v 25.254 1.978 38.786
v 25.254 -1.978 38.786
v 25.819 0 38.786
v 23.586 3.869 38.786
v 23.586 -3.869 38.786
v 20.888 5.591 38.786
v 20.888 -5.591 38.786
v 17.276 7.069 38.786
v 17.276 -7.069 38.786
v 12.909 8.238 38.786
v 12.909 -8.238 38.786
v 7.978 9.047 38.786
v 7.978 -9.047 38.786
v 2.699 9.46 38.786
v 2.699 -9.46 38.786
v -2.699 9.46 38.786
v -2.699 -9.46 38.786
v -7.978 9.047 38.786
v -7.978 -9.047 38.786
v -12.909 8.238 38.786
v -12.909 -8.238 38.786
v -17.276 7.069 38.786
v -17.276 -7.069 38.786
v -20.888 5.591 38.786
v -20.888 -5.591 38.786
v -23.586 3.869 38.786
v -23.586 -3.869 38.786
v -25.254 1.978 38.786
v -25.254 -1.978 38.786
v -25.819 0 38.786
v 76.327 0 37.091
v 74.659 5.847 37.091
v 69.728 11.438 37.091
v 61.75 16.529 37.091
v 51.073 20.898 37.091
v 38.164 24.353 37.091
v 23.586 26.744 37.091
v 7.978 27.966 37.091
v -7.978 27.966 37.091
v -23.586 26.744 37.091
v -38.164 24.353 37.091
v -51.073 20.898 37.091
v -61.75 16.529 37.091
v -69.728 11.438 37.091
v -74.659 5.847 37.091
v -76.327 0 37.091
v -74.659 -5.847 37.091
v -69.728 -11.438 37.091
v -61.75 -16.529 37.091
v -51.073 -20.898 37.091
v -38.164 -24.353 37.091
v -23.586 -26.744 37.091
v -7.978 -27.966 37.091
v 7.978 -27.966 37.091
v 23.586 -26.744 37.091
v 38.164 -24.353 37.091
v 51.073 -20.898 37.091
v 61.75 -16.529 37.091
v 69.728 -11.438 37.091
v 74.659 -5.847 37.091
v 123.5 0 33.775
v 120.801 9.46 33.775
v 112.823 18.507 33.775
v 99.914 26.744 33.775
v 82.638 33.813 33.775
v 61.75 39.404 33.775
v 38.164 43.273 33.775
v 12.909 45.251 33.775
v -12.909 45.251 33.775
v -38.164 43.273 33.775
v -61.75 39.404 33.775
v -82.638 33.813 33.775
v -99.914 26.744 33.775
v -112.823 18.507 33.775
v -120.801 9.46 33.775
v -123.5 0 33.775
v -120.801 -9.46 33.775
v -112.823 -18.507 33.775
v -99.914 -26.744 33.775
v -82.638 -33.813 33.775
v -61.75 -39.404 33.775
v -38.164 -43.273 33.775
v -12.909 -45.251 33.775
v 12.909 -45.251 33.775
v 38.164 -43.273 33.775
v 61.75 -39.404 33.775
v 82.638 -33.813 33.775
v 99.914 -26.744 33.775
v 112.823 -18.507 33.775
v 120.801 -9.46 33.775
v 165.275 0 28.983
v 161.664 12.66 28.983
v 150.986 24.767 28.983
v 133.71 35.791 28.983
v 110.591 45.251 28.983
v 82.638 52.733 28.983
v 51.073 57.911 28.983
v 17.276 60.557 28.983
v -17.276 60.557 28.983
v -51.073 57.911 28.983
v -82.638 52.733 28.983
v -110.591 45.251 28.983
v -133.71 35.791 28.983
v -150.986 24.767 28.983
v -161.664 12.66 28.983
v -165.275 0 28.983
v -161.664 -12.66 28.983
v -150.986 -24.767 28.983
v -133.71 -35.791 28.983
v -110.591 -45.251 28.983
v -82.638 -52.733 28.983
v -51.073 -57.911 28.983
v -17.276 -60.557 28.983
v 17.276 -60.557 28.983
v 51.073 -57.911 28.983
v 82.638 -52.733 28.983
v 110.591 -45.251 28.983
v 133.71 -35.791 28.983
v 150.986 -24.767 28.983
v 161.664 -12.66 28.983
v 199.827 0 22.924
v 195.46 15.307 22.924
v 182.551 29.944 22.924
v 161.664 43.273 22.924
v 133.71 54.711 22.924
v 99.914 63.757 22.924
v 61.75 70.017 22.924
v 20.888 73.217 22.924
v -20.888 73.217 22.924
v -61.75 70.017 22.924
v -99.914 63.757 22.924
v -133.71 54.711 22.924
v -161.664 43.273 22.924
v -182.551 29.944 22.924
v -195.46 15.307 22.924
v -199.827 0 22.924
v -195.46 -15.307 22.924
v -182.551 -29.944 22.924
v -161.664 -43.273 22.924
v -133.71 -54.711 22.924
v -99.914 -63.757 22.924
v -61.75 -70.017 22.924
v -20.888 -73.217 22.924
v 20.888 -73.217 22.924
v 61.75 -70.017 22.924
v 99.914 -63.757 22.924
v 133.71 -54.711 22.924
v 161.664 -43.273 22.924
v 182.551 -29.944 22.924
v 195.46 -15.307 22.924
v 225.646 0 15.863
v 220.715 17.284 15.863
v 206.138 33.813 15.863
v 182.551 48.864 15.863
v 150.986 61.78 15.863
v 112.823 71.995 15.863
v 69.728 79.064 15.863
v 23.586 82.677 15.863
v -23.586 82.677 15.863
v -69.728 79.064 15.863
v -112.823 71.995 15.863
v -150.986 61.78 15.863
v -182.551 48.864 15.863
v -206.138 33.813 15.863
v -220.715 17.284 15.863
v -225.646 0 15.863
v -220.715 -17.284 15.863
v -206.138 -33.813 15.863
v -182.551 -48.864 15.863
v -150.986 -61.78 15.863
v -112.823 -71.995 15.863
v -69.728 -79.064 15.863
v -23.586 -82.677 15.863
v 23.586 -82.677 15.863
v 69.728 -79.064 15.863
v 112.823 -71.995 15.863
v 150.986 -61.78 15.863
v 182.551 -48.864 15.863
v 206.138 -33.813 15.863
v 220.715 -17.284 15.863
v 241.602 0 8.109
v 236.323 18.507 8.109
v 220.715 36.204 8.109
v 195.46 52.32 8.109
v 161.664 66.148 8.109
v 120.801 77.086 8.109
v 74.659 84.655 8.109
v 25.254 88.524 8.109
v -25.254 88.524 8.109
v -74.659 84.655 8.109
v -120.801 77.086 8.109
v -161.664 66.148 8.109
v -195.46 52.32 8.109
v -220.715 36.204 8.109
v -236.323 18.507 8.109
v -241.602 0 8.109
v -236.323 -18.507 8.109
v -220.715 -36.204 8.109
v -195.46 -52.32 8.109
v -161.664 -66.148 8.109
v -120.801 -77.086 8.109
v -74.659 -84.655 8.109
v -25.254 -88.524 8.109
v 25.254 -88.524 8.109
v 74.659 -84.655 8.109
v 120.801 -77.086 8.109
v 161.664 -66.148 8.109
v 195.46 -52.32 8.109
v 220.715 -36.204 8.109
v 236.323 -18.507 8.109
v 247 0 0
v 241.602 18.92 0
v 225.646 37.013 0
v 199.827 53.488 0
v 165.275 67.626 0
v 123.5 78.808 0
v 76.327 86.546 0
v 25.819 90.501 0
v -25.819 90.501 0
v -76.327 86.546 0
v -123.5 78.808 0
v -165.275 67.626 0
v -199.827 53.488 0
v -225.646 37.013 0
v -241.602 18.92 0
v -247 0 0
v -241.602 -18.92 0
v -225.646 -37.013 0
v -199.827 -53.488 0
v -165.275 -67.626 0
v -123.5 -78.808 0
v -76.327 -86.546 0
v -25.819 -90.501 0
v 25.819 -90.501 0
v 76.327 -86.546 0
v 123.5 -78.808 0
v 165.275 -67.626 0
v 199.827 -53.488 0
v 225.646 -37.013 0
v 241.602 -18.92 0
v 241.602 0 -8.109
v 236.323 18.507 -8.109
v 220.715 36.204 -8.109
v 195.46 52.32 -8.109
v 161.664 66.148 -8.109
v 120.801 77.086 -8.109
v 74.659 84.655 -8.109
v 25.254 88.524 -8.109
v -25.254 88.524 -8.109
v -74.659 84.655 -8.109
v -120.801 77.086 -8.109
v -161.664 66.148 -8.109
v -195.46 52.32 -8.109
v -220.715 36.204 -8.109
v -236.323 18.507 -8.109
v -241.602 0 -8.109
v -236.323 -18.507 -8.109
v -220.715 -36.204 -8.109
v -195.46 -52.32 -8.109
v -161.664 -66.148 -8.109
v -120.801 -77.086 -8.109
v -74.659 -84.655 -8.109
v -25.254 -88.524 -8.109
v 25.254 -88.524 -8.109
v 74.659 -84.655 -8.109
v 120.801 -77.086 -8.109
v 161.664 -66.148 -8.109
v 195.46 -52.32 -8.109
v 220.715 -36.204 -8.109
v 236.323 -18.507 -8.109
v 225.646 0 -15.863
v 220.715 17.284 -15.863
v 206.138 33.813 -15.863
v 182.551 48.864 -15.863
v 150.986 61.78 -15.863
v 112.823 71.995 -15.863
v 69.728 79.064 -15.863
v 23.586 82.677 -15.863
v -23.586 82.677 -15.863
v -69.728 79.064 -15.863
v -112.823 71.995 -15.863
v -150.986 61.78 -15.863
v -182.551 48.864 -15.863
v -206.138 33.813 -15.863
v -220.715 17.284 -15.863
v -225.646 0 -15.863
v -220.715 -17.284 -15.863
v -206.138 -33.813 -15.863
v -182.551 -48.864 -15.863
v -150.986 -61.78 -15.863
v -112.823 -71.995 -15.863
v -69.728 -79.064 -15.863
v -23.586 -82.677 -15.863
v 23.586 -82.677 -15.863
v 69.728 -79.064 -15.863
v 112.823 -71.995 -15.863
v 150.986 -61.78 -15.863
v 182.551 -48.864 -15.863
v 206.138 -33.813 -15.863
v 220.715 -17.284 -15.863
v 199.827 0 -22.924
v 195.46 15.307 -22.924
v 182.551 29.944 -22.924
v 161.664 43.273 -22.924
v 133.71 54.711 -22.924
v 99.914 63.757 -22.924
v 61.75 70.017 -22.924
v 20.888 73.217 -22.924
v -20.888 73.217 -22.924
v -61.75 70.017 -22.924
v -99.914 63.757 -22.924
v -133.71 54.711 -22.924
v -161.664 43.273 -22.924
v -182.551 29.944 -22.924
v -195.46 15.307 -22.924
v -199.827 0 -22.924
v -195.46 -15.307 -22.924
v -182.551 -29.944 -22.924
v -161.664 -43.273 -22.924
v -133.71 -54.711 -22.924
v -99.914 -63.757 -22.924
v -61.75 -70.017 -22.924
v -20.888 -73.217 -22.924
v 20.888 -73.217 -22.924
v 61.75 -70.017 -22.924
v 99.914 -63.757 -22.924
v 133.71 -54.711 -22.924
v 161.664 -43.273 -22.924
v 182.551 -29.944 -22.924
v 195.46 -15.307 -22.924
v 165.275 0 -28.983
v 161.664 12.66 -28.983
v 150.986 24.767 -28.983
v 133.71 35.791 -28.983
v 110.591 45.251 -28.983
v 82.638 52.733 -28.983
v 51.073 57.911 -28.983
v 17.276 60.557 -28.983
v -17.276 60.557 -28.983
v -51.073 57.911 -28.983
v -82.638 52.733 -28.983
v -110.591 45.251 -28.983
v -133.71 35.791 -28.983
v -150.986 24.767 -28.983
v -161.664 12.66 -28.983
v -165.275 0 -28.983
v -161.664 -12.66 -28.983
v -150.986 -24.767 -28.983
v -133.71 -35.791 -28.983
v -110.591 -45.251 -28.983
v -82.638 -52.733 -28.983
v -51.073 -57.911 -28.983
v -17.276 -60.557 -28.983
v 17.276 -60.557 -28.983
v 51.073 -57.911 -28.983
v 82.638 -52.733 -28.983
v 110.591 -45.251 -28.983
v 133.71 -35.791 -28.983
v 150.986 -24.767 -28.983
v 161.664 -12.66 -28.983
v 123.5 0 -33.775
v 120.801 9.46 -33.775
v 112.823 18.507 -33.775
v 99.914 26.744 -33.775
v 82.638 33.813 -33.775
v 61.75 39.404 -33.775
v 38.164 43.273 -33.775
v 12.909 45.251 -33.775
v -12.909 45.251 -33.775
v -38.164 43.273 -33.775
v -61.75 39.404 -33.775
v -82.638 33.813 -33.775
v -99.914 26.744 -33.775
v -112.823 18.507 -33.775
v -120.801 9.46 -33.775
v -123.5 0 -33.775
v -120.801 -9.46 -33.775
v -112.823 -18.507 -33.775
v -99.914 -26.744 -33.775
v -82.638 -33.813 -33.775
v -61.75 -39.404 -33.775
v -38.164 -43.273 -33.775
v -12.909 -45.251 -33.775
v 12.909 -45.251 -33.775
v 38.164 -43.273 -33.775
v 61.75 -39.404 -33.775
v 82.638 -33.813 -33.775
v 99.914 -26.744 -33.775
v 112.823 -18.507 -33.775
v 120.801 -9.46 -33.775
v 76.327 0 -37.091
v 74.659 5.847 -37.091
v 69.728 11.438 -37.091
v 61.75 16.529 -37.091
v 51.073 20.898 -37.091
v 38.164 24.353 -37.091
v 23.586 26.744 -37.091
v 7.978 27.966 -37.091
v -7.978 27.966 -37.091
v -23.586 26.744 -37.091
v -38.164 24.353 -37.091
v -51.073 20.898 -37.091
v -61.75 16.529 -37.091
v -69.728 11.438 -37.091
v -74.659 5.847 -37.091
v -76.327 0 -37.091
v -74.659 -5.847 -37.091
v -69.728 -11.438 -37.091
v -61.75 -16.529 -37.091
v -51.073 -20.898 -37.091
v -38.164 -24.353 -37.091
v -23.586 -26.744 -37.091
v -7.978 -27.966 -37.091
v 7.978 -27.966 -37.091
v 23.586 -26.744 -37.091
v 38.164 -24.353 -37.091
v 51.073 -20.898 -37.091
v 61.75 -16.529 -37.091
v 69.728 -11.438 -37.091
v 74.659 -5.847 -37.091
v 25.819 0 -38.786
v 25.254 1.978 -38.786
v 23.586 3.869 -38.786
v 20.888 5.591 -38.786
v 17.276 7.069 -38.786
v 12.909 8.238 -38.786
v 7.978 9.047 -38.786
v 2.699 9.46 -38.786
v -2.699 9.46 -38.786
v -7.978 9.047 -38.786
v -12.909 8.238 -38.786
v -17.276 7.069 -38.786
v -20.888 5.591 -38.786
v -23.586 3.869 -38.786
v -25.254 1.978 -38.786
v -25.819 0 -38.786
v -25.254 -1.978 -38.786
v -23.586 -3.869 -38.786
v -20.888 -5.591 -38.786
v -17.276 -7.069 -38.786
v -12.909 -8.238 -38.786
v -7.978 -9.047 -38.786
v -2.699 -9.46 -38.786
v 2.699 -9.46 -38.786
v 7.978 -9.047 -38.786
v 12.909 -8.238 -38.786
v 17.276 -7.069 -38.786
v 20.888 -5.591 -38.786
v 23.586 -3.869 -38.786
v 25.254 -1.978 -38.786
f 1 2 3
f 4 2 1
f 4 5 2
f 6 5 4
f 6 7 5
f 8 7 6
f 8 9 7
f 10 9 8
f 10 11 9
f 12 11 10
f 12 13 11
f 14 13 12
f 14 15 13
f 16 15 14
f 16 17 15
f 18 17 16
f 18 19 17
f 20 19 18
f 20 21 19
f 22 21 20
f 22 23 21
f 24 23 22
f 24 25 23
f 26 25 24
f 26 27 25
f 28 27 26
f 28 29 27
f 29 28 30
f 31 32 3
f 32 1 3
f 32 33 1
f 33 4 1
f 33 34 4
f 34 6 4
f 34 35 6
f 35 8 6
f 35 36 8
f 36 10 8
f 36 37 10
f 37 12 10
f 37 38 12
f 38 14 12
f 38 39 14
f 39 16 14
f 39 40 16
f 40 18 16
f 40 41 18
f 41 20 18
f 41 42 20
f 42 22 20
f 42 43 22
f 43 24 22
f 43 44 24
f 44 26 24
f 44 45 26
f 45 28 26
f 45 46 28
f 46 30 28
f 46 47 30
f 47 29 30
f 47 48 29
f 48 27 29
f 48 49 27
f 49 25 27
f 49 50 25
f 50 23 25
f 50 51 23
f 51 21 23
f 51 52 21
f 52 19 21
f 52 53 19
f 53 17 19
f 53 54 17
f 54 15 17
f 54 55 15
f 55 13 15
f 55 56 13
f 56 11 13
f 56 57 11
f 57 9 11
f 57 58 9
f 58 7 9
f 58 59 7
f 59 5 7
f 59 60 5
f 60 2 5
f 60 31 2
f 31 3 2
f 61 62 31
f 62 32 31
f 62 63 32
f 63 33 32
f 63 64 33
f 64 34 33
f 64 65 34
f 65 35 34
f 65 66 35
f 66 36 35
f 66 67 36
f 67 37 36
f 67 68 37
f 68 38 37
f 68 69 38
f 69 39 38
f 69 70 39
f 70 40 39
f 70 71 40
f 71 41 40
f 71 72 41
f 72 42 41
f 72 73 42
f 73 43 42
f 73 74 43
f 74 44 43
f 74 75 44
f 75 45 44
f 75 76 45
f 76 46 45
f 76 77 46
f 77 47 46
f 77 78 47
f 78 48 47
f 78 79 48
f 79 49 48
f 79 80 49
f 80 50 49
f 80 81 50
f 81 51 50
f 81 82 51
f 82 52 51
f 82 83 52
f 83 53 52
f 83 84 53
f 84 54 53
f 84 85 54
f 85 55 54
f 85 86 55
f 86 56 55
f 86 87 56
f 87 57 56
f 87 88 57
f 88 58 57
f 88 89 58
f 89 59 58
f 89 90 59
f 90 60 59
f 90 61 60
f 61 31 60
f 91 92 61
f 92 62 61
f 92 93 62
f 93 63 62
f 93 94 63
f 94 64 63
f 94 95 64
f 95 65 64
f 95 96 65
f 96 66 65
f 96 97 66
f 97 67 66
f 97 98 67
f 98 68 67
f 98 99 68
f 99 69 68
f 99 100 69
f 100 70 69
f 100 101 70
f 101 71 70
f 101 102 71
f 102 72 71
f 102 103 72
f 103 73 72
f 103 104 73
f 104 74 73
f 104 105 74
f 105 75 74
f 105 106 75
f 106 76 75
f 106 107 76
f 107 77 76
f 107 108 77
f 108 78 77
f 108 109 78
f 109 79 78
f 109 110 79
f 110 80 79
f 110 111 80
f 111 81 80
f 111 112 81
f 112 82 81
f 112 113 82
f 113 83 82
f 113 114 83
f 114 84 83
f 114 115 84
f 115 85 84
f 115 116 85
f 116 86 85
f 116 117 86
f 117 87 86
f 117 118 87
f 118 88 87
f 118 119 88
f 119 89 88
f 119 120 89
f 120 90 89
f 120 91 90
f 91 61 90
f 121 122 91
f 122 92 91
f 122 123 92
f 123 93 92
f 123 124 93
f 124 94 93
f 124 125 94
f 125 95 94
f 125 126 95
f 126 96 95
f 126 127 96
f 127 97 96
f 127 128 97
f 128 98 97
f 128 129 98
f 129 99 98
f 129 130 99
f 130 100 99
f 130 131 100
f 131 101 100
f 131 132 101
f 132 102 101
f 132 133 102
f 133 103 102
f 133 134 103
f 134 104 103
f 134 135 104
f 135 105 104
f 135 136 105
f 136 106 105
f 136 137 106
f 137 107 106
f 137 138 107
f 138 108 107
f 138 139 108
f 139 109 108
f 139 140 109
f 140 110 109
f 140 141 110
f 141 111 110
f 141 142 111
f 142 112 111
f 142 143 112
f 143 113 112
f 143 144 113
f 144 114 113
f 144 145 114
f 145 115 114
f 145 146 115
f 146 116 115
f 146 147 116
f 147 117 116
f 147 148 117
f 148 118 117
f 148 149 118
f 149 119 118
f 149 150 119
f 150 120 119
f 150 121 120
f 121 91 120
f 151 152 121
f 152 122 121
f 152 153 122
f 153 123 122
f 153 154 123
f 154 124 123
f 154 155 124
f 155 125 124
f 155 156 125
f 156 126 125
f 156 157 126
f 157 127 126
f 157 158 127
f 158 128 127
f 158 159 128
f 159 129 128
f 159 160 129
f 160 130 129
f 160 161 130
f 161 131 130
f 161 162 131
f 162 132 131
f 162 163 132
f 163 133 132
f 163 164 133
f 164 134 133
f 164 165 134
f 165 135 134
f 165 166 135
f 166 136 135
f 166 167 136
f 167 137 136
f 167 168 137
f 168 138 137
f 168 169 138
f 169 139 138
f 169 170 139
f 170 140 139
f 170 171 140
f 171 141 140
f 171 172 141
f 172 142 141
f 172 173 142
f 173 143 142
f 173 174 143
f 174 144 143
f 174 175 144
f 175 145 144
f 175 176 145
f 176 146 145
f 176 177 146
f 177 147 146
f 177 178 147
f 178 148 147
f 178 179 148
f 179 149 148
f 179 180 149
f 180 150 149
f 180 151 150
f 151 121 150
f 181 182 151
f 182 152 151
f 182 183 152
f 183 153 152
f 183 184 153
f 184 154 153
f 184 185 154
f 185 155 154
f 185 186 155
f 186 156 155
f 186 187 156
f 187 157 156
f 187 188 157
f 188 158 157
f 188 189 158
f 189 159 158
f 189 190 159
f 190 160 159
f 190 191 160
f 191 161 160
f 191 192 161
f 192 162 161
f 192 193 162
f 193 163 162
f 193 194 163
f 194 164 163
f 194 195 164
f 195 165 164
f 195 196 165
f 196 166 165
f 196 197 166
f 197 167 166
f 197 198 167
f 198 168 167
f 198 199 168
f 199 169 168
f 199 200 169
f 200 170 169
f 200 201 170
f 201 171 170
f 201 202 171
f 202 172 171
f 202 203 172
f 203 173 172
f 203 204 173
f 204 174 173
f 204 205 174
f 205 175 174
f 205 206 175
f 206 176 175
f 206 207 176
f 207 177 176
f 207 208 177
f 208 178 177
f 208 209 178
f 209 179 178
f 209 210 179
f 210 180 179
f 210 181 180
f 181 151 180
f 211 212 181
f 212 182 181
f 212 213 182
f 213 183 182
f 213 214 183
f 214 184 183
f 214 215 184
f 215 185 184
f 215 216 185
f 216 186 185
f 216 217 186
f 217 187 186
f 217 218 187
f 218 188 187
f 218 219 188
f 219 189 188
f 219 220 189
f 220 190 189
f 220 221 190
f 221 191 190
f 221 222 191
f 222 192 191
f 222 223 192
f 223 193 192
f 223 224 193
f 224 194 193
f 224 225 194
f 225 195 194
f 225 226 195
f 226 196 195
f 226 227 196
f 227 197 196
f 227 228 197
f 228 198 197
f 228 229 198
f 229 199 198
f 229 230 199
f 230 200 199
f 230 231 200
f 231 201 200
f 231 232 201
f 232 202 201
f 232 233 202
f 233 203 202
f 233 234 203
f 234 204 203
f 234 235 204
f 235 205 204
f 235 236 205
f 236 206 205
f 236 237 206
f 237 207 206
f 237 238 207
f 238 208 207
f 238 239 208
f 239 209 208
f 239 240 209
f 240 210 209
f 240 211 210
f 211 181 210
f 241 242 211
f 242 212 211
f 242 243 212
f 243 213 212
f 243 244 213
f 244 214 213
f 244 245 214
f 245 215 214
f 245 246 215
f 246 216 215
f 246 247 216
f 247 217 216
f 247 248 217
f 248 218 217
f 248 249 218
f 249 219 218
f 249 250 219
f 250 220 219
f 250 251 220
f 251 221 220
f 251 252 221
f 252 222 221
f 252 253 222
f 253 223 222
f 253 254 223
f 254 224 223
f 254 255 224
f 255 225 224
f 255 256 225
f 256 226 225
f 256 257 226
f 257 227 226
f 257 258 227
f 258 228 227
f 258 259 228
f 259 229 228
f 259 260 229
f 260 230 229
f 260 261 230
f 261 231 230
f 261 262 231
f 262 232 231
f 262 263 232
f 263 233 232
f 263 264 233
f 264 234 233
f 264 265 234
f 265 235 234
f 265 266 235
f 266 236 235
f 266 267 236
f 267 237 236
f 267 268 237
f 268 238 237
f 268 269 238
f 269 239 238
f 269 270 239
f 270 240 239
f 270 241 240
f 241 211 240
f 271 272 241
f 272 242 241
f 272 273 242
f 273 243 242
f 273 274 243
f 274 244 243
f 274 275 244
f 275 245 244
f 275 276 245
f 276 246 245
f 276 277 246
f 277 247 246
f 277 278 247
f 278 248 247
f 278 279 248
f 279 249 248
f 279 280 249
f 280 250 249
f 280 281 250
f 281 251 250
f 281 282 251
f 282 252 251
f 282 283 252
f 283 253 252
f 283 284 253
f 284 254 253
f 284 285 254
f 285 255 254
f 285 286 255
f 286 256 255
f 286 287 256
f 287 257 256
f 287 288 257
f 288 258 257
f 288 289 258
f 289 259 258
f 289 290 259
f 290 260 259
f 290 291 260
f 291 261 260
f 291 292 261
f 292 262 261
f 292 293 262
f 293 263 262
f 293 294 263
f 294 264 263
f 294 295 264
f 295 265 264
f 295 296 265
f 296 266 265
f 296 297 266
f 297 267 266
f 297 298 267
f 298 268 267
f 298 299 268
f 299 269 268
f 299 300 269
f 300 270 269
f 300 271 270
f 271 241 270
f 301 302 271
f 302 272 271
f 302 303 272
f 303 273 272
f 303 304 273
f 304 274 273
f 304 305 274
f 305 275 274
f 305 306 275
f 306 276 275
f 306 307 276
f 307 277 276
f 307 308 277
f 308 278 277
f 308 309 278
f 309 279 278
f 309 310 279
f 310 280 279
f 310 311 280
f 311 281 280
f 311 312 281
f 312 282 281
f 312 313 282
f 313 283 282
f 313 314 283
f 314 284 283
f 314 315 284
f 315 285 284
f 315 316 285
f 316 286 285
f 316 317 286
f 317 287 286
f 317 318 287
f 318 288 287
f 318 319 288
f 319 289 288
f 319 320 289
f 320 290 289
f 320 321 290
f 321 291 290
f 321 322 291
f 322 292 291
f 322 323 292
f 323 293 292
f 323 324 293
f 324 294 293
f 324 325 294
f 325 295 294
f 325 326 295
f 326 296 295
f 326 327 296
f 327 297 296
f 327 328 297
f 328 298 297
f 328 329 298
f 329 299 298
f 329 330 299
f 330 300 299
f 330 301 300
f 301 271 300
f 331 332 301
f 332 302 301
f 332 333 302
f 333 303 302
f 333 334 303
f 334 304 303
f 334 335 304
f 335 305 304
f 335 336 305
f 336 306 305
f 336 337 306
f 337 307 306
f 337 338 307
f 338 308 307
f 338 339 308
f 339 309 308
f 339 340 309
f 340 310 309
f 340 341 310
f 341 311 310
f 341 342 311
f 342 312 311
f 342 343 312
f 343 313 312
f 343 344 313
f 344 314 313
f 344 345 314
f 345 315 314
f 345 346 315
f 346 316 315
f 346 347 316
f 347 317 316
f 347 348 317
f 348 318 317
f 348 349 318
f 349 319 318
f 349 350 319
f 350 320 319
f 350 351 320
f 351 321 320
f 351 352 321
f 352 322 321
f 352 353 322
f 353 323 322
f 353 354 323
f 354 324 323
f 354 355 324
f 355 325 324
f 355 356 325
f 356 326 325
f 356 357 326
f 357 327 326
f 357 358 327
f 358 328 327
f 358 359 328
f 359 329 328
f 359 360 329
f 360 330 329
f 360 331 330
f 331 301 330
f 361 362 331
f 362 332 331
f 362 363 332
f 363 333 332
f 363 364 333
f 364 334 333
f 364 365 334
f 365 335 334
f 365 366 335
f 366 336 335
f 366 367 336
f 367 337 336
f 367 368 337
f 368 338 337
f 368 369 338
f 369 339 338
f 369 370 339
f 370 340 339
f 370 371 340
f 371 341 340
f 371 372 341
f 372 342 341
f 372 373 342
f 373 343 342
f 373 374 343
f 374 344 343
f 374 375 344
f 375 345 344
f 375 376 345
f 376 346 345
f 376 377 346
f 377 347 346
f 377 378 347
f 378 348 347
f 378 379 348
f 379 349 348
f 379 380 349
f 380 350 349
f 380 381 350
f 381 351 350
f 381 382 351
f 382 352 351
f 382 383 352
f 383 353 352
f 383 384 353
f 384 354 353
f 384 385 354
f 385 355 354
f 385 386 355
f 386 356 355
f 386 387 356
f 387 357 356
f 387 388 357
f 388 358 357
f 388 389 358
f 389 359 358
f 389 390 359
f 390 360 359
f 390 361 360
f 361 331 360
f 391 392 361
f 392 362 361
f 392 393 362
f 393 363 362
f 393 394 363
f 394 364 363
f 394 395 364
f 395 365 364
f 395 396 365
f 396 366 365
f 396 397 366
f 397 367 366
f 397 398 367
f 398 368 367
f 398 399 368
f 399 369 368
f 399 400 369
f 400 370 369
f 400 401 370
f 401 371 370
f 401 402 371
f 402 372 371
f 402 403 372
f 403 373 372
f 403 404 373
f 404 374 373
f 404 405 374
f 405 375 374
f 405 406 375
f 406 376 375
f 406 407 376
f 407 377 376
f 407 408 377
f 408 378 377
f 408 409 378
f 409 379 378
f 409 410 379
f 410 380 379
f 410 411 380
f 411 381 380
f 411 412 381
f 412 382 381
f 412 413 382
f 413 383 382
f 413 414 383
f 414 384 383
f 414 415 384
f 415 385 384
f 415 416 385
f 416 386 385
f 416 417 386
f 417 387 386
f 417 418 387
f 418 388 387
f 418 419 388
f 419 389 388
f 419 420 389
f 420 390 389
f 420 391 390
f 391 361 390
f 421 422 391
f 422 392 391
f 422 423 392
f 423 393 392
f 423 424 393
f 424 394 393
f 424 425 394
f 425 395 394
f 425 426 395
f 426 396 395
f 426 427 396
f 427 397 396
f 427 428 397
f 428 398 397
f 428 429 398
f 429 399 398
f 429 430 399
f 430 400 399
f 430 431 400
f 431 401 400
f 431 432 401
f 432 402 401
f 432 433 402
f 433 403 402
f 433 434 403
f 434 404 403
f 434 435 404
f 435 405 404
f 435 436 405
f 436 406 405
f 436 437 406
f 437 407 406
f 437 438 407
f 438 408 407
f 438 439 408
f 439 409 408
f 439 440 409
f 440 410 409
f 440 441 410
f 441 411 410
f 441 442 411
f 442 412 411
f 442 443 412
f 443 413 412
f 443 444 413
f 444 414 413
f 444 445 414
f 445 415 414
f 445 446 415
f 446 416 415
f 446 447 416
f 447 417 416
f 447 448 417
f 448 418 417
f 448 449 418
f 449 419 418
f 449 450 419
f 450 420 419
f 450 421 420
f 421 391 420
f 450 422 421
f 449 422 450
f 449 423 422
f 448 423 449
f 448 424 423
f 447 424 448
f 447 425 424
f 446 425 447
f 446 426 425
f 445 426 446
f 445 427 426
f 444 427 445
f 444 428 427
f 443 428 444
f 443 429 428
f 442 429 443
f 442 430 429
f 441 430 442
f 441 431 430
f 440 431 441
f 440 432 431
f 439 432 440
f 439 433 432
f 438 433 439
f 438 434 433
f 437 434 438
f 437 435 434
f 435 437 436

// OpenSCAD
// Generated by SolidPython 1.0.1 on 2020-07-29 00:46:53


scale(v = [19, 7, 3]) {
	sphere(r = 13);
}
/***********************************************
*********      SolidPython code:      **********
************************************************
 
# import packages: SolidPython
from solid import *
from solid.utils import *
from itertools import chain, combinations, permutations


class Resize:

    def __init__(self, scad_file):
        self.scad_file = scad_file
        #self.scad_file = import_scad(scad_file)
        # cone/cylinder param:
        self.r1 = 0
        self.r2 = 0
        self.h = 0
        # rectangular prism param:
        self.w = 0
        self.l = 0
        # ellipse param:
        self.r = 0

    # import OpenScad code (file name corresponds to shape)


    # classify shape + parameters
    def assign(self, param1, param2, param3):
        if self.scad_file == 'cone.scad':
            self.r1 = param1
            self.r2 = param2
            self.h = param3
        elif self.scad_file == 'cylinder.scad':
            self.r1 = param1
            self.r2 = param2
            self.h = param3
        elif self.scad_file == 'rectangularPrism.scad':
            self.h = param1
            self.l = param2
            self.w = param3
        else:
            self.r = param1
            self.h = param2

    # resize parameters
    def iterate(self):
        x = range(3, 20, 2)
        i = 1
        if self.scad_file == 'cone.scad':
            tempList = list(permutations(x, 2))
            for temp in tempList:
                param1 = temp[0]
                param2 = temp[1]
                filepath = 'produced_scad_files/' + 'cone' + str(param1) + '_' + str(param2) + '_' + '.scad'
                scad_render_to_file(cylinder(h=param1, r1=param2, r2=0), filepath)

        elif self.scad_file == 'cylinder.scad':
            tempList = list(permutations(x, 3))
            for temp in tempList:
                param1 = temp[0]
                param2 = temp[1]
                filepath = 'produced_scad_files/' + 'cylinder' + str(param1) + '_' + str(param2) + '_' + '.scad'
                scad_render_to_file(cylinder(h=param1, r1=param2, r2=param2), filepath)

        elif self.scad_file == 'rectangularPrism.scad':
            tempList = list(permutations(x, 3))
            for temp in tempList:
                param1 = temp[0]
                param2 = temp[1]
                param3 = temp[2]
                filepath = 'produced_scad_files/' + 'rectangularPrism' + str(param1) + '_' + str(param2) + '_' + str(
                    param3) + '.scad'
                scad_render_to_file(cube(size=(param1, param2, param3)), filepath)

        elif self.scad_file == 'ellipse.scad':
            tempList = list(permutations(x, 4))
            for temp in tempList:
                param1 = temp[0]
                param2 = temp[1]
                param3 = temp[2]
                param4 = temp[3]
                filepath = 'produced_scad_files/' + 'ellipse' + str(param1) + '_' + str(param2) + '_' + str(param3) + '_' + str(param4) + '.scad'
                scad_render_to_file(scale([param1, param2, param3])(sphere(r=param4)), filepath)

    def render_to_scadfile(self):
        scad_render_to_file(scad, 'example.scad') 
 
************************************************/
